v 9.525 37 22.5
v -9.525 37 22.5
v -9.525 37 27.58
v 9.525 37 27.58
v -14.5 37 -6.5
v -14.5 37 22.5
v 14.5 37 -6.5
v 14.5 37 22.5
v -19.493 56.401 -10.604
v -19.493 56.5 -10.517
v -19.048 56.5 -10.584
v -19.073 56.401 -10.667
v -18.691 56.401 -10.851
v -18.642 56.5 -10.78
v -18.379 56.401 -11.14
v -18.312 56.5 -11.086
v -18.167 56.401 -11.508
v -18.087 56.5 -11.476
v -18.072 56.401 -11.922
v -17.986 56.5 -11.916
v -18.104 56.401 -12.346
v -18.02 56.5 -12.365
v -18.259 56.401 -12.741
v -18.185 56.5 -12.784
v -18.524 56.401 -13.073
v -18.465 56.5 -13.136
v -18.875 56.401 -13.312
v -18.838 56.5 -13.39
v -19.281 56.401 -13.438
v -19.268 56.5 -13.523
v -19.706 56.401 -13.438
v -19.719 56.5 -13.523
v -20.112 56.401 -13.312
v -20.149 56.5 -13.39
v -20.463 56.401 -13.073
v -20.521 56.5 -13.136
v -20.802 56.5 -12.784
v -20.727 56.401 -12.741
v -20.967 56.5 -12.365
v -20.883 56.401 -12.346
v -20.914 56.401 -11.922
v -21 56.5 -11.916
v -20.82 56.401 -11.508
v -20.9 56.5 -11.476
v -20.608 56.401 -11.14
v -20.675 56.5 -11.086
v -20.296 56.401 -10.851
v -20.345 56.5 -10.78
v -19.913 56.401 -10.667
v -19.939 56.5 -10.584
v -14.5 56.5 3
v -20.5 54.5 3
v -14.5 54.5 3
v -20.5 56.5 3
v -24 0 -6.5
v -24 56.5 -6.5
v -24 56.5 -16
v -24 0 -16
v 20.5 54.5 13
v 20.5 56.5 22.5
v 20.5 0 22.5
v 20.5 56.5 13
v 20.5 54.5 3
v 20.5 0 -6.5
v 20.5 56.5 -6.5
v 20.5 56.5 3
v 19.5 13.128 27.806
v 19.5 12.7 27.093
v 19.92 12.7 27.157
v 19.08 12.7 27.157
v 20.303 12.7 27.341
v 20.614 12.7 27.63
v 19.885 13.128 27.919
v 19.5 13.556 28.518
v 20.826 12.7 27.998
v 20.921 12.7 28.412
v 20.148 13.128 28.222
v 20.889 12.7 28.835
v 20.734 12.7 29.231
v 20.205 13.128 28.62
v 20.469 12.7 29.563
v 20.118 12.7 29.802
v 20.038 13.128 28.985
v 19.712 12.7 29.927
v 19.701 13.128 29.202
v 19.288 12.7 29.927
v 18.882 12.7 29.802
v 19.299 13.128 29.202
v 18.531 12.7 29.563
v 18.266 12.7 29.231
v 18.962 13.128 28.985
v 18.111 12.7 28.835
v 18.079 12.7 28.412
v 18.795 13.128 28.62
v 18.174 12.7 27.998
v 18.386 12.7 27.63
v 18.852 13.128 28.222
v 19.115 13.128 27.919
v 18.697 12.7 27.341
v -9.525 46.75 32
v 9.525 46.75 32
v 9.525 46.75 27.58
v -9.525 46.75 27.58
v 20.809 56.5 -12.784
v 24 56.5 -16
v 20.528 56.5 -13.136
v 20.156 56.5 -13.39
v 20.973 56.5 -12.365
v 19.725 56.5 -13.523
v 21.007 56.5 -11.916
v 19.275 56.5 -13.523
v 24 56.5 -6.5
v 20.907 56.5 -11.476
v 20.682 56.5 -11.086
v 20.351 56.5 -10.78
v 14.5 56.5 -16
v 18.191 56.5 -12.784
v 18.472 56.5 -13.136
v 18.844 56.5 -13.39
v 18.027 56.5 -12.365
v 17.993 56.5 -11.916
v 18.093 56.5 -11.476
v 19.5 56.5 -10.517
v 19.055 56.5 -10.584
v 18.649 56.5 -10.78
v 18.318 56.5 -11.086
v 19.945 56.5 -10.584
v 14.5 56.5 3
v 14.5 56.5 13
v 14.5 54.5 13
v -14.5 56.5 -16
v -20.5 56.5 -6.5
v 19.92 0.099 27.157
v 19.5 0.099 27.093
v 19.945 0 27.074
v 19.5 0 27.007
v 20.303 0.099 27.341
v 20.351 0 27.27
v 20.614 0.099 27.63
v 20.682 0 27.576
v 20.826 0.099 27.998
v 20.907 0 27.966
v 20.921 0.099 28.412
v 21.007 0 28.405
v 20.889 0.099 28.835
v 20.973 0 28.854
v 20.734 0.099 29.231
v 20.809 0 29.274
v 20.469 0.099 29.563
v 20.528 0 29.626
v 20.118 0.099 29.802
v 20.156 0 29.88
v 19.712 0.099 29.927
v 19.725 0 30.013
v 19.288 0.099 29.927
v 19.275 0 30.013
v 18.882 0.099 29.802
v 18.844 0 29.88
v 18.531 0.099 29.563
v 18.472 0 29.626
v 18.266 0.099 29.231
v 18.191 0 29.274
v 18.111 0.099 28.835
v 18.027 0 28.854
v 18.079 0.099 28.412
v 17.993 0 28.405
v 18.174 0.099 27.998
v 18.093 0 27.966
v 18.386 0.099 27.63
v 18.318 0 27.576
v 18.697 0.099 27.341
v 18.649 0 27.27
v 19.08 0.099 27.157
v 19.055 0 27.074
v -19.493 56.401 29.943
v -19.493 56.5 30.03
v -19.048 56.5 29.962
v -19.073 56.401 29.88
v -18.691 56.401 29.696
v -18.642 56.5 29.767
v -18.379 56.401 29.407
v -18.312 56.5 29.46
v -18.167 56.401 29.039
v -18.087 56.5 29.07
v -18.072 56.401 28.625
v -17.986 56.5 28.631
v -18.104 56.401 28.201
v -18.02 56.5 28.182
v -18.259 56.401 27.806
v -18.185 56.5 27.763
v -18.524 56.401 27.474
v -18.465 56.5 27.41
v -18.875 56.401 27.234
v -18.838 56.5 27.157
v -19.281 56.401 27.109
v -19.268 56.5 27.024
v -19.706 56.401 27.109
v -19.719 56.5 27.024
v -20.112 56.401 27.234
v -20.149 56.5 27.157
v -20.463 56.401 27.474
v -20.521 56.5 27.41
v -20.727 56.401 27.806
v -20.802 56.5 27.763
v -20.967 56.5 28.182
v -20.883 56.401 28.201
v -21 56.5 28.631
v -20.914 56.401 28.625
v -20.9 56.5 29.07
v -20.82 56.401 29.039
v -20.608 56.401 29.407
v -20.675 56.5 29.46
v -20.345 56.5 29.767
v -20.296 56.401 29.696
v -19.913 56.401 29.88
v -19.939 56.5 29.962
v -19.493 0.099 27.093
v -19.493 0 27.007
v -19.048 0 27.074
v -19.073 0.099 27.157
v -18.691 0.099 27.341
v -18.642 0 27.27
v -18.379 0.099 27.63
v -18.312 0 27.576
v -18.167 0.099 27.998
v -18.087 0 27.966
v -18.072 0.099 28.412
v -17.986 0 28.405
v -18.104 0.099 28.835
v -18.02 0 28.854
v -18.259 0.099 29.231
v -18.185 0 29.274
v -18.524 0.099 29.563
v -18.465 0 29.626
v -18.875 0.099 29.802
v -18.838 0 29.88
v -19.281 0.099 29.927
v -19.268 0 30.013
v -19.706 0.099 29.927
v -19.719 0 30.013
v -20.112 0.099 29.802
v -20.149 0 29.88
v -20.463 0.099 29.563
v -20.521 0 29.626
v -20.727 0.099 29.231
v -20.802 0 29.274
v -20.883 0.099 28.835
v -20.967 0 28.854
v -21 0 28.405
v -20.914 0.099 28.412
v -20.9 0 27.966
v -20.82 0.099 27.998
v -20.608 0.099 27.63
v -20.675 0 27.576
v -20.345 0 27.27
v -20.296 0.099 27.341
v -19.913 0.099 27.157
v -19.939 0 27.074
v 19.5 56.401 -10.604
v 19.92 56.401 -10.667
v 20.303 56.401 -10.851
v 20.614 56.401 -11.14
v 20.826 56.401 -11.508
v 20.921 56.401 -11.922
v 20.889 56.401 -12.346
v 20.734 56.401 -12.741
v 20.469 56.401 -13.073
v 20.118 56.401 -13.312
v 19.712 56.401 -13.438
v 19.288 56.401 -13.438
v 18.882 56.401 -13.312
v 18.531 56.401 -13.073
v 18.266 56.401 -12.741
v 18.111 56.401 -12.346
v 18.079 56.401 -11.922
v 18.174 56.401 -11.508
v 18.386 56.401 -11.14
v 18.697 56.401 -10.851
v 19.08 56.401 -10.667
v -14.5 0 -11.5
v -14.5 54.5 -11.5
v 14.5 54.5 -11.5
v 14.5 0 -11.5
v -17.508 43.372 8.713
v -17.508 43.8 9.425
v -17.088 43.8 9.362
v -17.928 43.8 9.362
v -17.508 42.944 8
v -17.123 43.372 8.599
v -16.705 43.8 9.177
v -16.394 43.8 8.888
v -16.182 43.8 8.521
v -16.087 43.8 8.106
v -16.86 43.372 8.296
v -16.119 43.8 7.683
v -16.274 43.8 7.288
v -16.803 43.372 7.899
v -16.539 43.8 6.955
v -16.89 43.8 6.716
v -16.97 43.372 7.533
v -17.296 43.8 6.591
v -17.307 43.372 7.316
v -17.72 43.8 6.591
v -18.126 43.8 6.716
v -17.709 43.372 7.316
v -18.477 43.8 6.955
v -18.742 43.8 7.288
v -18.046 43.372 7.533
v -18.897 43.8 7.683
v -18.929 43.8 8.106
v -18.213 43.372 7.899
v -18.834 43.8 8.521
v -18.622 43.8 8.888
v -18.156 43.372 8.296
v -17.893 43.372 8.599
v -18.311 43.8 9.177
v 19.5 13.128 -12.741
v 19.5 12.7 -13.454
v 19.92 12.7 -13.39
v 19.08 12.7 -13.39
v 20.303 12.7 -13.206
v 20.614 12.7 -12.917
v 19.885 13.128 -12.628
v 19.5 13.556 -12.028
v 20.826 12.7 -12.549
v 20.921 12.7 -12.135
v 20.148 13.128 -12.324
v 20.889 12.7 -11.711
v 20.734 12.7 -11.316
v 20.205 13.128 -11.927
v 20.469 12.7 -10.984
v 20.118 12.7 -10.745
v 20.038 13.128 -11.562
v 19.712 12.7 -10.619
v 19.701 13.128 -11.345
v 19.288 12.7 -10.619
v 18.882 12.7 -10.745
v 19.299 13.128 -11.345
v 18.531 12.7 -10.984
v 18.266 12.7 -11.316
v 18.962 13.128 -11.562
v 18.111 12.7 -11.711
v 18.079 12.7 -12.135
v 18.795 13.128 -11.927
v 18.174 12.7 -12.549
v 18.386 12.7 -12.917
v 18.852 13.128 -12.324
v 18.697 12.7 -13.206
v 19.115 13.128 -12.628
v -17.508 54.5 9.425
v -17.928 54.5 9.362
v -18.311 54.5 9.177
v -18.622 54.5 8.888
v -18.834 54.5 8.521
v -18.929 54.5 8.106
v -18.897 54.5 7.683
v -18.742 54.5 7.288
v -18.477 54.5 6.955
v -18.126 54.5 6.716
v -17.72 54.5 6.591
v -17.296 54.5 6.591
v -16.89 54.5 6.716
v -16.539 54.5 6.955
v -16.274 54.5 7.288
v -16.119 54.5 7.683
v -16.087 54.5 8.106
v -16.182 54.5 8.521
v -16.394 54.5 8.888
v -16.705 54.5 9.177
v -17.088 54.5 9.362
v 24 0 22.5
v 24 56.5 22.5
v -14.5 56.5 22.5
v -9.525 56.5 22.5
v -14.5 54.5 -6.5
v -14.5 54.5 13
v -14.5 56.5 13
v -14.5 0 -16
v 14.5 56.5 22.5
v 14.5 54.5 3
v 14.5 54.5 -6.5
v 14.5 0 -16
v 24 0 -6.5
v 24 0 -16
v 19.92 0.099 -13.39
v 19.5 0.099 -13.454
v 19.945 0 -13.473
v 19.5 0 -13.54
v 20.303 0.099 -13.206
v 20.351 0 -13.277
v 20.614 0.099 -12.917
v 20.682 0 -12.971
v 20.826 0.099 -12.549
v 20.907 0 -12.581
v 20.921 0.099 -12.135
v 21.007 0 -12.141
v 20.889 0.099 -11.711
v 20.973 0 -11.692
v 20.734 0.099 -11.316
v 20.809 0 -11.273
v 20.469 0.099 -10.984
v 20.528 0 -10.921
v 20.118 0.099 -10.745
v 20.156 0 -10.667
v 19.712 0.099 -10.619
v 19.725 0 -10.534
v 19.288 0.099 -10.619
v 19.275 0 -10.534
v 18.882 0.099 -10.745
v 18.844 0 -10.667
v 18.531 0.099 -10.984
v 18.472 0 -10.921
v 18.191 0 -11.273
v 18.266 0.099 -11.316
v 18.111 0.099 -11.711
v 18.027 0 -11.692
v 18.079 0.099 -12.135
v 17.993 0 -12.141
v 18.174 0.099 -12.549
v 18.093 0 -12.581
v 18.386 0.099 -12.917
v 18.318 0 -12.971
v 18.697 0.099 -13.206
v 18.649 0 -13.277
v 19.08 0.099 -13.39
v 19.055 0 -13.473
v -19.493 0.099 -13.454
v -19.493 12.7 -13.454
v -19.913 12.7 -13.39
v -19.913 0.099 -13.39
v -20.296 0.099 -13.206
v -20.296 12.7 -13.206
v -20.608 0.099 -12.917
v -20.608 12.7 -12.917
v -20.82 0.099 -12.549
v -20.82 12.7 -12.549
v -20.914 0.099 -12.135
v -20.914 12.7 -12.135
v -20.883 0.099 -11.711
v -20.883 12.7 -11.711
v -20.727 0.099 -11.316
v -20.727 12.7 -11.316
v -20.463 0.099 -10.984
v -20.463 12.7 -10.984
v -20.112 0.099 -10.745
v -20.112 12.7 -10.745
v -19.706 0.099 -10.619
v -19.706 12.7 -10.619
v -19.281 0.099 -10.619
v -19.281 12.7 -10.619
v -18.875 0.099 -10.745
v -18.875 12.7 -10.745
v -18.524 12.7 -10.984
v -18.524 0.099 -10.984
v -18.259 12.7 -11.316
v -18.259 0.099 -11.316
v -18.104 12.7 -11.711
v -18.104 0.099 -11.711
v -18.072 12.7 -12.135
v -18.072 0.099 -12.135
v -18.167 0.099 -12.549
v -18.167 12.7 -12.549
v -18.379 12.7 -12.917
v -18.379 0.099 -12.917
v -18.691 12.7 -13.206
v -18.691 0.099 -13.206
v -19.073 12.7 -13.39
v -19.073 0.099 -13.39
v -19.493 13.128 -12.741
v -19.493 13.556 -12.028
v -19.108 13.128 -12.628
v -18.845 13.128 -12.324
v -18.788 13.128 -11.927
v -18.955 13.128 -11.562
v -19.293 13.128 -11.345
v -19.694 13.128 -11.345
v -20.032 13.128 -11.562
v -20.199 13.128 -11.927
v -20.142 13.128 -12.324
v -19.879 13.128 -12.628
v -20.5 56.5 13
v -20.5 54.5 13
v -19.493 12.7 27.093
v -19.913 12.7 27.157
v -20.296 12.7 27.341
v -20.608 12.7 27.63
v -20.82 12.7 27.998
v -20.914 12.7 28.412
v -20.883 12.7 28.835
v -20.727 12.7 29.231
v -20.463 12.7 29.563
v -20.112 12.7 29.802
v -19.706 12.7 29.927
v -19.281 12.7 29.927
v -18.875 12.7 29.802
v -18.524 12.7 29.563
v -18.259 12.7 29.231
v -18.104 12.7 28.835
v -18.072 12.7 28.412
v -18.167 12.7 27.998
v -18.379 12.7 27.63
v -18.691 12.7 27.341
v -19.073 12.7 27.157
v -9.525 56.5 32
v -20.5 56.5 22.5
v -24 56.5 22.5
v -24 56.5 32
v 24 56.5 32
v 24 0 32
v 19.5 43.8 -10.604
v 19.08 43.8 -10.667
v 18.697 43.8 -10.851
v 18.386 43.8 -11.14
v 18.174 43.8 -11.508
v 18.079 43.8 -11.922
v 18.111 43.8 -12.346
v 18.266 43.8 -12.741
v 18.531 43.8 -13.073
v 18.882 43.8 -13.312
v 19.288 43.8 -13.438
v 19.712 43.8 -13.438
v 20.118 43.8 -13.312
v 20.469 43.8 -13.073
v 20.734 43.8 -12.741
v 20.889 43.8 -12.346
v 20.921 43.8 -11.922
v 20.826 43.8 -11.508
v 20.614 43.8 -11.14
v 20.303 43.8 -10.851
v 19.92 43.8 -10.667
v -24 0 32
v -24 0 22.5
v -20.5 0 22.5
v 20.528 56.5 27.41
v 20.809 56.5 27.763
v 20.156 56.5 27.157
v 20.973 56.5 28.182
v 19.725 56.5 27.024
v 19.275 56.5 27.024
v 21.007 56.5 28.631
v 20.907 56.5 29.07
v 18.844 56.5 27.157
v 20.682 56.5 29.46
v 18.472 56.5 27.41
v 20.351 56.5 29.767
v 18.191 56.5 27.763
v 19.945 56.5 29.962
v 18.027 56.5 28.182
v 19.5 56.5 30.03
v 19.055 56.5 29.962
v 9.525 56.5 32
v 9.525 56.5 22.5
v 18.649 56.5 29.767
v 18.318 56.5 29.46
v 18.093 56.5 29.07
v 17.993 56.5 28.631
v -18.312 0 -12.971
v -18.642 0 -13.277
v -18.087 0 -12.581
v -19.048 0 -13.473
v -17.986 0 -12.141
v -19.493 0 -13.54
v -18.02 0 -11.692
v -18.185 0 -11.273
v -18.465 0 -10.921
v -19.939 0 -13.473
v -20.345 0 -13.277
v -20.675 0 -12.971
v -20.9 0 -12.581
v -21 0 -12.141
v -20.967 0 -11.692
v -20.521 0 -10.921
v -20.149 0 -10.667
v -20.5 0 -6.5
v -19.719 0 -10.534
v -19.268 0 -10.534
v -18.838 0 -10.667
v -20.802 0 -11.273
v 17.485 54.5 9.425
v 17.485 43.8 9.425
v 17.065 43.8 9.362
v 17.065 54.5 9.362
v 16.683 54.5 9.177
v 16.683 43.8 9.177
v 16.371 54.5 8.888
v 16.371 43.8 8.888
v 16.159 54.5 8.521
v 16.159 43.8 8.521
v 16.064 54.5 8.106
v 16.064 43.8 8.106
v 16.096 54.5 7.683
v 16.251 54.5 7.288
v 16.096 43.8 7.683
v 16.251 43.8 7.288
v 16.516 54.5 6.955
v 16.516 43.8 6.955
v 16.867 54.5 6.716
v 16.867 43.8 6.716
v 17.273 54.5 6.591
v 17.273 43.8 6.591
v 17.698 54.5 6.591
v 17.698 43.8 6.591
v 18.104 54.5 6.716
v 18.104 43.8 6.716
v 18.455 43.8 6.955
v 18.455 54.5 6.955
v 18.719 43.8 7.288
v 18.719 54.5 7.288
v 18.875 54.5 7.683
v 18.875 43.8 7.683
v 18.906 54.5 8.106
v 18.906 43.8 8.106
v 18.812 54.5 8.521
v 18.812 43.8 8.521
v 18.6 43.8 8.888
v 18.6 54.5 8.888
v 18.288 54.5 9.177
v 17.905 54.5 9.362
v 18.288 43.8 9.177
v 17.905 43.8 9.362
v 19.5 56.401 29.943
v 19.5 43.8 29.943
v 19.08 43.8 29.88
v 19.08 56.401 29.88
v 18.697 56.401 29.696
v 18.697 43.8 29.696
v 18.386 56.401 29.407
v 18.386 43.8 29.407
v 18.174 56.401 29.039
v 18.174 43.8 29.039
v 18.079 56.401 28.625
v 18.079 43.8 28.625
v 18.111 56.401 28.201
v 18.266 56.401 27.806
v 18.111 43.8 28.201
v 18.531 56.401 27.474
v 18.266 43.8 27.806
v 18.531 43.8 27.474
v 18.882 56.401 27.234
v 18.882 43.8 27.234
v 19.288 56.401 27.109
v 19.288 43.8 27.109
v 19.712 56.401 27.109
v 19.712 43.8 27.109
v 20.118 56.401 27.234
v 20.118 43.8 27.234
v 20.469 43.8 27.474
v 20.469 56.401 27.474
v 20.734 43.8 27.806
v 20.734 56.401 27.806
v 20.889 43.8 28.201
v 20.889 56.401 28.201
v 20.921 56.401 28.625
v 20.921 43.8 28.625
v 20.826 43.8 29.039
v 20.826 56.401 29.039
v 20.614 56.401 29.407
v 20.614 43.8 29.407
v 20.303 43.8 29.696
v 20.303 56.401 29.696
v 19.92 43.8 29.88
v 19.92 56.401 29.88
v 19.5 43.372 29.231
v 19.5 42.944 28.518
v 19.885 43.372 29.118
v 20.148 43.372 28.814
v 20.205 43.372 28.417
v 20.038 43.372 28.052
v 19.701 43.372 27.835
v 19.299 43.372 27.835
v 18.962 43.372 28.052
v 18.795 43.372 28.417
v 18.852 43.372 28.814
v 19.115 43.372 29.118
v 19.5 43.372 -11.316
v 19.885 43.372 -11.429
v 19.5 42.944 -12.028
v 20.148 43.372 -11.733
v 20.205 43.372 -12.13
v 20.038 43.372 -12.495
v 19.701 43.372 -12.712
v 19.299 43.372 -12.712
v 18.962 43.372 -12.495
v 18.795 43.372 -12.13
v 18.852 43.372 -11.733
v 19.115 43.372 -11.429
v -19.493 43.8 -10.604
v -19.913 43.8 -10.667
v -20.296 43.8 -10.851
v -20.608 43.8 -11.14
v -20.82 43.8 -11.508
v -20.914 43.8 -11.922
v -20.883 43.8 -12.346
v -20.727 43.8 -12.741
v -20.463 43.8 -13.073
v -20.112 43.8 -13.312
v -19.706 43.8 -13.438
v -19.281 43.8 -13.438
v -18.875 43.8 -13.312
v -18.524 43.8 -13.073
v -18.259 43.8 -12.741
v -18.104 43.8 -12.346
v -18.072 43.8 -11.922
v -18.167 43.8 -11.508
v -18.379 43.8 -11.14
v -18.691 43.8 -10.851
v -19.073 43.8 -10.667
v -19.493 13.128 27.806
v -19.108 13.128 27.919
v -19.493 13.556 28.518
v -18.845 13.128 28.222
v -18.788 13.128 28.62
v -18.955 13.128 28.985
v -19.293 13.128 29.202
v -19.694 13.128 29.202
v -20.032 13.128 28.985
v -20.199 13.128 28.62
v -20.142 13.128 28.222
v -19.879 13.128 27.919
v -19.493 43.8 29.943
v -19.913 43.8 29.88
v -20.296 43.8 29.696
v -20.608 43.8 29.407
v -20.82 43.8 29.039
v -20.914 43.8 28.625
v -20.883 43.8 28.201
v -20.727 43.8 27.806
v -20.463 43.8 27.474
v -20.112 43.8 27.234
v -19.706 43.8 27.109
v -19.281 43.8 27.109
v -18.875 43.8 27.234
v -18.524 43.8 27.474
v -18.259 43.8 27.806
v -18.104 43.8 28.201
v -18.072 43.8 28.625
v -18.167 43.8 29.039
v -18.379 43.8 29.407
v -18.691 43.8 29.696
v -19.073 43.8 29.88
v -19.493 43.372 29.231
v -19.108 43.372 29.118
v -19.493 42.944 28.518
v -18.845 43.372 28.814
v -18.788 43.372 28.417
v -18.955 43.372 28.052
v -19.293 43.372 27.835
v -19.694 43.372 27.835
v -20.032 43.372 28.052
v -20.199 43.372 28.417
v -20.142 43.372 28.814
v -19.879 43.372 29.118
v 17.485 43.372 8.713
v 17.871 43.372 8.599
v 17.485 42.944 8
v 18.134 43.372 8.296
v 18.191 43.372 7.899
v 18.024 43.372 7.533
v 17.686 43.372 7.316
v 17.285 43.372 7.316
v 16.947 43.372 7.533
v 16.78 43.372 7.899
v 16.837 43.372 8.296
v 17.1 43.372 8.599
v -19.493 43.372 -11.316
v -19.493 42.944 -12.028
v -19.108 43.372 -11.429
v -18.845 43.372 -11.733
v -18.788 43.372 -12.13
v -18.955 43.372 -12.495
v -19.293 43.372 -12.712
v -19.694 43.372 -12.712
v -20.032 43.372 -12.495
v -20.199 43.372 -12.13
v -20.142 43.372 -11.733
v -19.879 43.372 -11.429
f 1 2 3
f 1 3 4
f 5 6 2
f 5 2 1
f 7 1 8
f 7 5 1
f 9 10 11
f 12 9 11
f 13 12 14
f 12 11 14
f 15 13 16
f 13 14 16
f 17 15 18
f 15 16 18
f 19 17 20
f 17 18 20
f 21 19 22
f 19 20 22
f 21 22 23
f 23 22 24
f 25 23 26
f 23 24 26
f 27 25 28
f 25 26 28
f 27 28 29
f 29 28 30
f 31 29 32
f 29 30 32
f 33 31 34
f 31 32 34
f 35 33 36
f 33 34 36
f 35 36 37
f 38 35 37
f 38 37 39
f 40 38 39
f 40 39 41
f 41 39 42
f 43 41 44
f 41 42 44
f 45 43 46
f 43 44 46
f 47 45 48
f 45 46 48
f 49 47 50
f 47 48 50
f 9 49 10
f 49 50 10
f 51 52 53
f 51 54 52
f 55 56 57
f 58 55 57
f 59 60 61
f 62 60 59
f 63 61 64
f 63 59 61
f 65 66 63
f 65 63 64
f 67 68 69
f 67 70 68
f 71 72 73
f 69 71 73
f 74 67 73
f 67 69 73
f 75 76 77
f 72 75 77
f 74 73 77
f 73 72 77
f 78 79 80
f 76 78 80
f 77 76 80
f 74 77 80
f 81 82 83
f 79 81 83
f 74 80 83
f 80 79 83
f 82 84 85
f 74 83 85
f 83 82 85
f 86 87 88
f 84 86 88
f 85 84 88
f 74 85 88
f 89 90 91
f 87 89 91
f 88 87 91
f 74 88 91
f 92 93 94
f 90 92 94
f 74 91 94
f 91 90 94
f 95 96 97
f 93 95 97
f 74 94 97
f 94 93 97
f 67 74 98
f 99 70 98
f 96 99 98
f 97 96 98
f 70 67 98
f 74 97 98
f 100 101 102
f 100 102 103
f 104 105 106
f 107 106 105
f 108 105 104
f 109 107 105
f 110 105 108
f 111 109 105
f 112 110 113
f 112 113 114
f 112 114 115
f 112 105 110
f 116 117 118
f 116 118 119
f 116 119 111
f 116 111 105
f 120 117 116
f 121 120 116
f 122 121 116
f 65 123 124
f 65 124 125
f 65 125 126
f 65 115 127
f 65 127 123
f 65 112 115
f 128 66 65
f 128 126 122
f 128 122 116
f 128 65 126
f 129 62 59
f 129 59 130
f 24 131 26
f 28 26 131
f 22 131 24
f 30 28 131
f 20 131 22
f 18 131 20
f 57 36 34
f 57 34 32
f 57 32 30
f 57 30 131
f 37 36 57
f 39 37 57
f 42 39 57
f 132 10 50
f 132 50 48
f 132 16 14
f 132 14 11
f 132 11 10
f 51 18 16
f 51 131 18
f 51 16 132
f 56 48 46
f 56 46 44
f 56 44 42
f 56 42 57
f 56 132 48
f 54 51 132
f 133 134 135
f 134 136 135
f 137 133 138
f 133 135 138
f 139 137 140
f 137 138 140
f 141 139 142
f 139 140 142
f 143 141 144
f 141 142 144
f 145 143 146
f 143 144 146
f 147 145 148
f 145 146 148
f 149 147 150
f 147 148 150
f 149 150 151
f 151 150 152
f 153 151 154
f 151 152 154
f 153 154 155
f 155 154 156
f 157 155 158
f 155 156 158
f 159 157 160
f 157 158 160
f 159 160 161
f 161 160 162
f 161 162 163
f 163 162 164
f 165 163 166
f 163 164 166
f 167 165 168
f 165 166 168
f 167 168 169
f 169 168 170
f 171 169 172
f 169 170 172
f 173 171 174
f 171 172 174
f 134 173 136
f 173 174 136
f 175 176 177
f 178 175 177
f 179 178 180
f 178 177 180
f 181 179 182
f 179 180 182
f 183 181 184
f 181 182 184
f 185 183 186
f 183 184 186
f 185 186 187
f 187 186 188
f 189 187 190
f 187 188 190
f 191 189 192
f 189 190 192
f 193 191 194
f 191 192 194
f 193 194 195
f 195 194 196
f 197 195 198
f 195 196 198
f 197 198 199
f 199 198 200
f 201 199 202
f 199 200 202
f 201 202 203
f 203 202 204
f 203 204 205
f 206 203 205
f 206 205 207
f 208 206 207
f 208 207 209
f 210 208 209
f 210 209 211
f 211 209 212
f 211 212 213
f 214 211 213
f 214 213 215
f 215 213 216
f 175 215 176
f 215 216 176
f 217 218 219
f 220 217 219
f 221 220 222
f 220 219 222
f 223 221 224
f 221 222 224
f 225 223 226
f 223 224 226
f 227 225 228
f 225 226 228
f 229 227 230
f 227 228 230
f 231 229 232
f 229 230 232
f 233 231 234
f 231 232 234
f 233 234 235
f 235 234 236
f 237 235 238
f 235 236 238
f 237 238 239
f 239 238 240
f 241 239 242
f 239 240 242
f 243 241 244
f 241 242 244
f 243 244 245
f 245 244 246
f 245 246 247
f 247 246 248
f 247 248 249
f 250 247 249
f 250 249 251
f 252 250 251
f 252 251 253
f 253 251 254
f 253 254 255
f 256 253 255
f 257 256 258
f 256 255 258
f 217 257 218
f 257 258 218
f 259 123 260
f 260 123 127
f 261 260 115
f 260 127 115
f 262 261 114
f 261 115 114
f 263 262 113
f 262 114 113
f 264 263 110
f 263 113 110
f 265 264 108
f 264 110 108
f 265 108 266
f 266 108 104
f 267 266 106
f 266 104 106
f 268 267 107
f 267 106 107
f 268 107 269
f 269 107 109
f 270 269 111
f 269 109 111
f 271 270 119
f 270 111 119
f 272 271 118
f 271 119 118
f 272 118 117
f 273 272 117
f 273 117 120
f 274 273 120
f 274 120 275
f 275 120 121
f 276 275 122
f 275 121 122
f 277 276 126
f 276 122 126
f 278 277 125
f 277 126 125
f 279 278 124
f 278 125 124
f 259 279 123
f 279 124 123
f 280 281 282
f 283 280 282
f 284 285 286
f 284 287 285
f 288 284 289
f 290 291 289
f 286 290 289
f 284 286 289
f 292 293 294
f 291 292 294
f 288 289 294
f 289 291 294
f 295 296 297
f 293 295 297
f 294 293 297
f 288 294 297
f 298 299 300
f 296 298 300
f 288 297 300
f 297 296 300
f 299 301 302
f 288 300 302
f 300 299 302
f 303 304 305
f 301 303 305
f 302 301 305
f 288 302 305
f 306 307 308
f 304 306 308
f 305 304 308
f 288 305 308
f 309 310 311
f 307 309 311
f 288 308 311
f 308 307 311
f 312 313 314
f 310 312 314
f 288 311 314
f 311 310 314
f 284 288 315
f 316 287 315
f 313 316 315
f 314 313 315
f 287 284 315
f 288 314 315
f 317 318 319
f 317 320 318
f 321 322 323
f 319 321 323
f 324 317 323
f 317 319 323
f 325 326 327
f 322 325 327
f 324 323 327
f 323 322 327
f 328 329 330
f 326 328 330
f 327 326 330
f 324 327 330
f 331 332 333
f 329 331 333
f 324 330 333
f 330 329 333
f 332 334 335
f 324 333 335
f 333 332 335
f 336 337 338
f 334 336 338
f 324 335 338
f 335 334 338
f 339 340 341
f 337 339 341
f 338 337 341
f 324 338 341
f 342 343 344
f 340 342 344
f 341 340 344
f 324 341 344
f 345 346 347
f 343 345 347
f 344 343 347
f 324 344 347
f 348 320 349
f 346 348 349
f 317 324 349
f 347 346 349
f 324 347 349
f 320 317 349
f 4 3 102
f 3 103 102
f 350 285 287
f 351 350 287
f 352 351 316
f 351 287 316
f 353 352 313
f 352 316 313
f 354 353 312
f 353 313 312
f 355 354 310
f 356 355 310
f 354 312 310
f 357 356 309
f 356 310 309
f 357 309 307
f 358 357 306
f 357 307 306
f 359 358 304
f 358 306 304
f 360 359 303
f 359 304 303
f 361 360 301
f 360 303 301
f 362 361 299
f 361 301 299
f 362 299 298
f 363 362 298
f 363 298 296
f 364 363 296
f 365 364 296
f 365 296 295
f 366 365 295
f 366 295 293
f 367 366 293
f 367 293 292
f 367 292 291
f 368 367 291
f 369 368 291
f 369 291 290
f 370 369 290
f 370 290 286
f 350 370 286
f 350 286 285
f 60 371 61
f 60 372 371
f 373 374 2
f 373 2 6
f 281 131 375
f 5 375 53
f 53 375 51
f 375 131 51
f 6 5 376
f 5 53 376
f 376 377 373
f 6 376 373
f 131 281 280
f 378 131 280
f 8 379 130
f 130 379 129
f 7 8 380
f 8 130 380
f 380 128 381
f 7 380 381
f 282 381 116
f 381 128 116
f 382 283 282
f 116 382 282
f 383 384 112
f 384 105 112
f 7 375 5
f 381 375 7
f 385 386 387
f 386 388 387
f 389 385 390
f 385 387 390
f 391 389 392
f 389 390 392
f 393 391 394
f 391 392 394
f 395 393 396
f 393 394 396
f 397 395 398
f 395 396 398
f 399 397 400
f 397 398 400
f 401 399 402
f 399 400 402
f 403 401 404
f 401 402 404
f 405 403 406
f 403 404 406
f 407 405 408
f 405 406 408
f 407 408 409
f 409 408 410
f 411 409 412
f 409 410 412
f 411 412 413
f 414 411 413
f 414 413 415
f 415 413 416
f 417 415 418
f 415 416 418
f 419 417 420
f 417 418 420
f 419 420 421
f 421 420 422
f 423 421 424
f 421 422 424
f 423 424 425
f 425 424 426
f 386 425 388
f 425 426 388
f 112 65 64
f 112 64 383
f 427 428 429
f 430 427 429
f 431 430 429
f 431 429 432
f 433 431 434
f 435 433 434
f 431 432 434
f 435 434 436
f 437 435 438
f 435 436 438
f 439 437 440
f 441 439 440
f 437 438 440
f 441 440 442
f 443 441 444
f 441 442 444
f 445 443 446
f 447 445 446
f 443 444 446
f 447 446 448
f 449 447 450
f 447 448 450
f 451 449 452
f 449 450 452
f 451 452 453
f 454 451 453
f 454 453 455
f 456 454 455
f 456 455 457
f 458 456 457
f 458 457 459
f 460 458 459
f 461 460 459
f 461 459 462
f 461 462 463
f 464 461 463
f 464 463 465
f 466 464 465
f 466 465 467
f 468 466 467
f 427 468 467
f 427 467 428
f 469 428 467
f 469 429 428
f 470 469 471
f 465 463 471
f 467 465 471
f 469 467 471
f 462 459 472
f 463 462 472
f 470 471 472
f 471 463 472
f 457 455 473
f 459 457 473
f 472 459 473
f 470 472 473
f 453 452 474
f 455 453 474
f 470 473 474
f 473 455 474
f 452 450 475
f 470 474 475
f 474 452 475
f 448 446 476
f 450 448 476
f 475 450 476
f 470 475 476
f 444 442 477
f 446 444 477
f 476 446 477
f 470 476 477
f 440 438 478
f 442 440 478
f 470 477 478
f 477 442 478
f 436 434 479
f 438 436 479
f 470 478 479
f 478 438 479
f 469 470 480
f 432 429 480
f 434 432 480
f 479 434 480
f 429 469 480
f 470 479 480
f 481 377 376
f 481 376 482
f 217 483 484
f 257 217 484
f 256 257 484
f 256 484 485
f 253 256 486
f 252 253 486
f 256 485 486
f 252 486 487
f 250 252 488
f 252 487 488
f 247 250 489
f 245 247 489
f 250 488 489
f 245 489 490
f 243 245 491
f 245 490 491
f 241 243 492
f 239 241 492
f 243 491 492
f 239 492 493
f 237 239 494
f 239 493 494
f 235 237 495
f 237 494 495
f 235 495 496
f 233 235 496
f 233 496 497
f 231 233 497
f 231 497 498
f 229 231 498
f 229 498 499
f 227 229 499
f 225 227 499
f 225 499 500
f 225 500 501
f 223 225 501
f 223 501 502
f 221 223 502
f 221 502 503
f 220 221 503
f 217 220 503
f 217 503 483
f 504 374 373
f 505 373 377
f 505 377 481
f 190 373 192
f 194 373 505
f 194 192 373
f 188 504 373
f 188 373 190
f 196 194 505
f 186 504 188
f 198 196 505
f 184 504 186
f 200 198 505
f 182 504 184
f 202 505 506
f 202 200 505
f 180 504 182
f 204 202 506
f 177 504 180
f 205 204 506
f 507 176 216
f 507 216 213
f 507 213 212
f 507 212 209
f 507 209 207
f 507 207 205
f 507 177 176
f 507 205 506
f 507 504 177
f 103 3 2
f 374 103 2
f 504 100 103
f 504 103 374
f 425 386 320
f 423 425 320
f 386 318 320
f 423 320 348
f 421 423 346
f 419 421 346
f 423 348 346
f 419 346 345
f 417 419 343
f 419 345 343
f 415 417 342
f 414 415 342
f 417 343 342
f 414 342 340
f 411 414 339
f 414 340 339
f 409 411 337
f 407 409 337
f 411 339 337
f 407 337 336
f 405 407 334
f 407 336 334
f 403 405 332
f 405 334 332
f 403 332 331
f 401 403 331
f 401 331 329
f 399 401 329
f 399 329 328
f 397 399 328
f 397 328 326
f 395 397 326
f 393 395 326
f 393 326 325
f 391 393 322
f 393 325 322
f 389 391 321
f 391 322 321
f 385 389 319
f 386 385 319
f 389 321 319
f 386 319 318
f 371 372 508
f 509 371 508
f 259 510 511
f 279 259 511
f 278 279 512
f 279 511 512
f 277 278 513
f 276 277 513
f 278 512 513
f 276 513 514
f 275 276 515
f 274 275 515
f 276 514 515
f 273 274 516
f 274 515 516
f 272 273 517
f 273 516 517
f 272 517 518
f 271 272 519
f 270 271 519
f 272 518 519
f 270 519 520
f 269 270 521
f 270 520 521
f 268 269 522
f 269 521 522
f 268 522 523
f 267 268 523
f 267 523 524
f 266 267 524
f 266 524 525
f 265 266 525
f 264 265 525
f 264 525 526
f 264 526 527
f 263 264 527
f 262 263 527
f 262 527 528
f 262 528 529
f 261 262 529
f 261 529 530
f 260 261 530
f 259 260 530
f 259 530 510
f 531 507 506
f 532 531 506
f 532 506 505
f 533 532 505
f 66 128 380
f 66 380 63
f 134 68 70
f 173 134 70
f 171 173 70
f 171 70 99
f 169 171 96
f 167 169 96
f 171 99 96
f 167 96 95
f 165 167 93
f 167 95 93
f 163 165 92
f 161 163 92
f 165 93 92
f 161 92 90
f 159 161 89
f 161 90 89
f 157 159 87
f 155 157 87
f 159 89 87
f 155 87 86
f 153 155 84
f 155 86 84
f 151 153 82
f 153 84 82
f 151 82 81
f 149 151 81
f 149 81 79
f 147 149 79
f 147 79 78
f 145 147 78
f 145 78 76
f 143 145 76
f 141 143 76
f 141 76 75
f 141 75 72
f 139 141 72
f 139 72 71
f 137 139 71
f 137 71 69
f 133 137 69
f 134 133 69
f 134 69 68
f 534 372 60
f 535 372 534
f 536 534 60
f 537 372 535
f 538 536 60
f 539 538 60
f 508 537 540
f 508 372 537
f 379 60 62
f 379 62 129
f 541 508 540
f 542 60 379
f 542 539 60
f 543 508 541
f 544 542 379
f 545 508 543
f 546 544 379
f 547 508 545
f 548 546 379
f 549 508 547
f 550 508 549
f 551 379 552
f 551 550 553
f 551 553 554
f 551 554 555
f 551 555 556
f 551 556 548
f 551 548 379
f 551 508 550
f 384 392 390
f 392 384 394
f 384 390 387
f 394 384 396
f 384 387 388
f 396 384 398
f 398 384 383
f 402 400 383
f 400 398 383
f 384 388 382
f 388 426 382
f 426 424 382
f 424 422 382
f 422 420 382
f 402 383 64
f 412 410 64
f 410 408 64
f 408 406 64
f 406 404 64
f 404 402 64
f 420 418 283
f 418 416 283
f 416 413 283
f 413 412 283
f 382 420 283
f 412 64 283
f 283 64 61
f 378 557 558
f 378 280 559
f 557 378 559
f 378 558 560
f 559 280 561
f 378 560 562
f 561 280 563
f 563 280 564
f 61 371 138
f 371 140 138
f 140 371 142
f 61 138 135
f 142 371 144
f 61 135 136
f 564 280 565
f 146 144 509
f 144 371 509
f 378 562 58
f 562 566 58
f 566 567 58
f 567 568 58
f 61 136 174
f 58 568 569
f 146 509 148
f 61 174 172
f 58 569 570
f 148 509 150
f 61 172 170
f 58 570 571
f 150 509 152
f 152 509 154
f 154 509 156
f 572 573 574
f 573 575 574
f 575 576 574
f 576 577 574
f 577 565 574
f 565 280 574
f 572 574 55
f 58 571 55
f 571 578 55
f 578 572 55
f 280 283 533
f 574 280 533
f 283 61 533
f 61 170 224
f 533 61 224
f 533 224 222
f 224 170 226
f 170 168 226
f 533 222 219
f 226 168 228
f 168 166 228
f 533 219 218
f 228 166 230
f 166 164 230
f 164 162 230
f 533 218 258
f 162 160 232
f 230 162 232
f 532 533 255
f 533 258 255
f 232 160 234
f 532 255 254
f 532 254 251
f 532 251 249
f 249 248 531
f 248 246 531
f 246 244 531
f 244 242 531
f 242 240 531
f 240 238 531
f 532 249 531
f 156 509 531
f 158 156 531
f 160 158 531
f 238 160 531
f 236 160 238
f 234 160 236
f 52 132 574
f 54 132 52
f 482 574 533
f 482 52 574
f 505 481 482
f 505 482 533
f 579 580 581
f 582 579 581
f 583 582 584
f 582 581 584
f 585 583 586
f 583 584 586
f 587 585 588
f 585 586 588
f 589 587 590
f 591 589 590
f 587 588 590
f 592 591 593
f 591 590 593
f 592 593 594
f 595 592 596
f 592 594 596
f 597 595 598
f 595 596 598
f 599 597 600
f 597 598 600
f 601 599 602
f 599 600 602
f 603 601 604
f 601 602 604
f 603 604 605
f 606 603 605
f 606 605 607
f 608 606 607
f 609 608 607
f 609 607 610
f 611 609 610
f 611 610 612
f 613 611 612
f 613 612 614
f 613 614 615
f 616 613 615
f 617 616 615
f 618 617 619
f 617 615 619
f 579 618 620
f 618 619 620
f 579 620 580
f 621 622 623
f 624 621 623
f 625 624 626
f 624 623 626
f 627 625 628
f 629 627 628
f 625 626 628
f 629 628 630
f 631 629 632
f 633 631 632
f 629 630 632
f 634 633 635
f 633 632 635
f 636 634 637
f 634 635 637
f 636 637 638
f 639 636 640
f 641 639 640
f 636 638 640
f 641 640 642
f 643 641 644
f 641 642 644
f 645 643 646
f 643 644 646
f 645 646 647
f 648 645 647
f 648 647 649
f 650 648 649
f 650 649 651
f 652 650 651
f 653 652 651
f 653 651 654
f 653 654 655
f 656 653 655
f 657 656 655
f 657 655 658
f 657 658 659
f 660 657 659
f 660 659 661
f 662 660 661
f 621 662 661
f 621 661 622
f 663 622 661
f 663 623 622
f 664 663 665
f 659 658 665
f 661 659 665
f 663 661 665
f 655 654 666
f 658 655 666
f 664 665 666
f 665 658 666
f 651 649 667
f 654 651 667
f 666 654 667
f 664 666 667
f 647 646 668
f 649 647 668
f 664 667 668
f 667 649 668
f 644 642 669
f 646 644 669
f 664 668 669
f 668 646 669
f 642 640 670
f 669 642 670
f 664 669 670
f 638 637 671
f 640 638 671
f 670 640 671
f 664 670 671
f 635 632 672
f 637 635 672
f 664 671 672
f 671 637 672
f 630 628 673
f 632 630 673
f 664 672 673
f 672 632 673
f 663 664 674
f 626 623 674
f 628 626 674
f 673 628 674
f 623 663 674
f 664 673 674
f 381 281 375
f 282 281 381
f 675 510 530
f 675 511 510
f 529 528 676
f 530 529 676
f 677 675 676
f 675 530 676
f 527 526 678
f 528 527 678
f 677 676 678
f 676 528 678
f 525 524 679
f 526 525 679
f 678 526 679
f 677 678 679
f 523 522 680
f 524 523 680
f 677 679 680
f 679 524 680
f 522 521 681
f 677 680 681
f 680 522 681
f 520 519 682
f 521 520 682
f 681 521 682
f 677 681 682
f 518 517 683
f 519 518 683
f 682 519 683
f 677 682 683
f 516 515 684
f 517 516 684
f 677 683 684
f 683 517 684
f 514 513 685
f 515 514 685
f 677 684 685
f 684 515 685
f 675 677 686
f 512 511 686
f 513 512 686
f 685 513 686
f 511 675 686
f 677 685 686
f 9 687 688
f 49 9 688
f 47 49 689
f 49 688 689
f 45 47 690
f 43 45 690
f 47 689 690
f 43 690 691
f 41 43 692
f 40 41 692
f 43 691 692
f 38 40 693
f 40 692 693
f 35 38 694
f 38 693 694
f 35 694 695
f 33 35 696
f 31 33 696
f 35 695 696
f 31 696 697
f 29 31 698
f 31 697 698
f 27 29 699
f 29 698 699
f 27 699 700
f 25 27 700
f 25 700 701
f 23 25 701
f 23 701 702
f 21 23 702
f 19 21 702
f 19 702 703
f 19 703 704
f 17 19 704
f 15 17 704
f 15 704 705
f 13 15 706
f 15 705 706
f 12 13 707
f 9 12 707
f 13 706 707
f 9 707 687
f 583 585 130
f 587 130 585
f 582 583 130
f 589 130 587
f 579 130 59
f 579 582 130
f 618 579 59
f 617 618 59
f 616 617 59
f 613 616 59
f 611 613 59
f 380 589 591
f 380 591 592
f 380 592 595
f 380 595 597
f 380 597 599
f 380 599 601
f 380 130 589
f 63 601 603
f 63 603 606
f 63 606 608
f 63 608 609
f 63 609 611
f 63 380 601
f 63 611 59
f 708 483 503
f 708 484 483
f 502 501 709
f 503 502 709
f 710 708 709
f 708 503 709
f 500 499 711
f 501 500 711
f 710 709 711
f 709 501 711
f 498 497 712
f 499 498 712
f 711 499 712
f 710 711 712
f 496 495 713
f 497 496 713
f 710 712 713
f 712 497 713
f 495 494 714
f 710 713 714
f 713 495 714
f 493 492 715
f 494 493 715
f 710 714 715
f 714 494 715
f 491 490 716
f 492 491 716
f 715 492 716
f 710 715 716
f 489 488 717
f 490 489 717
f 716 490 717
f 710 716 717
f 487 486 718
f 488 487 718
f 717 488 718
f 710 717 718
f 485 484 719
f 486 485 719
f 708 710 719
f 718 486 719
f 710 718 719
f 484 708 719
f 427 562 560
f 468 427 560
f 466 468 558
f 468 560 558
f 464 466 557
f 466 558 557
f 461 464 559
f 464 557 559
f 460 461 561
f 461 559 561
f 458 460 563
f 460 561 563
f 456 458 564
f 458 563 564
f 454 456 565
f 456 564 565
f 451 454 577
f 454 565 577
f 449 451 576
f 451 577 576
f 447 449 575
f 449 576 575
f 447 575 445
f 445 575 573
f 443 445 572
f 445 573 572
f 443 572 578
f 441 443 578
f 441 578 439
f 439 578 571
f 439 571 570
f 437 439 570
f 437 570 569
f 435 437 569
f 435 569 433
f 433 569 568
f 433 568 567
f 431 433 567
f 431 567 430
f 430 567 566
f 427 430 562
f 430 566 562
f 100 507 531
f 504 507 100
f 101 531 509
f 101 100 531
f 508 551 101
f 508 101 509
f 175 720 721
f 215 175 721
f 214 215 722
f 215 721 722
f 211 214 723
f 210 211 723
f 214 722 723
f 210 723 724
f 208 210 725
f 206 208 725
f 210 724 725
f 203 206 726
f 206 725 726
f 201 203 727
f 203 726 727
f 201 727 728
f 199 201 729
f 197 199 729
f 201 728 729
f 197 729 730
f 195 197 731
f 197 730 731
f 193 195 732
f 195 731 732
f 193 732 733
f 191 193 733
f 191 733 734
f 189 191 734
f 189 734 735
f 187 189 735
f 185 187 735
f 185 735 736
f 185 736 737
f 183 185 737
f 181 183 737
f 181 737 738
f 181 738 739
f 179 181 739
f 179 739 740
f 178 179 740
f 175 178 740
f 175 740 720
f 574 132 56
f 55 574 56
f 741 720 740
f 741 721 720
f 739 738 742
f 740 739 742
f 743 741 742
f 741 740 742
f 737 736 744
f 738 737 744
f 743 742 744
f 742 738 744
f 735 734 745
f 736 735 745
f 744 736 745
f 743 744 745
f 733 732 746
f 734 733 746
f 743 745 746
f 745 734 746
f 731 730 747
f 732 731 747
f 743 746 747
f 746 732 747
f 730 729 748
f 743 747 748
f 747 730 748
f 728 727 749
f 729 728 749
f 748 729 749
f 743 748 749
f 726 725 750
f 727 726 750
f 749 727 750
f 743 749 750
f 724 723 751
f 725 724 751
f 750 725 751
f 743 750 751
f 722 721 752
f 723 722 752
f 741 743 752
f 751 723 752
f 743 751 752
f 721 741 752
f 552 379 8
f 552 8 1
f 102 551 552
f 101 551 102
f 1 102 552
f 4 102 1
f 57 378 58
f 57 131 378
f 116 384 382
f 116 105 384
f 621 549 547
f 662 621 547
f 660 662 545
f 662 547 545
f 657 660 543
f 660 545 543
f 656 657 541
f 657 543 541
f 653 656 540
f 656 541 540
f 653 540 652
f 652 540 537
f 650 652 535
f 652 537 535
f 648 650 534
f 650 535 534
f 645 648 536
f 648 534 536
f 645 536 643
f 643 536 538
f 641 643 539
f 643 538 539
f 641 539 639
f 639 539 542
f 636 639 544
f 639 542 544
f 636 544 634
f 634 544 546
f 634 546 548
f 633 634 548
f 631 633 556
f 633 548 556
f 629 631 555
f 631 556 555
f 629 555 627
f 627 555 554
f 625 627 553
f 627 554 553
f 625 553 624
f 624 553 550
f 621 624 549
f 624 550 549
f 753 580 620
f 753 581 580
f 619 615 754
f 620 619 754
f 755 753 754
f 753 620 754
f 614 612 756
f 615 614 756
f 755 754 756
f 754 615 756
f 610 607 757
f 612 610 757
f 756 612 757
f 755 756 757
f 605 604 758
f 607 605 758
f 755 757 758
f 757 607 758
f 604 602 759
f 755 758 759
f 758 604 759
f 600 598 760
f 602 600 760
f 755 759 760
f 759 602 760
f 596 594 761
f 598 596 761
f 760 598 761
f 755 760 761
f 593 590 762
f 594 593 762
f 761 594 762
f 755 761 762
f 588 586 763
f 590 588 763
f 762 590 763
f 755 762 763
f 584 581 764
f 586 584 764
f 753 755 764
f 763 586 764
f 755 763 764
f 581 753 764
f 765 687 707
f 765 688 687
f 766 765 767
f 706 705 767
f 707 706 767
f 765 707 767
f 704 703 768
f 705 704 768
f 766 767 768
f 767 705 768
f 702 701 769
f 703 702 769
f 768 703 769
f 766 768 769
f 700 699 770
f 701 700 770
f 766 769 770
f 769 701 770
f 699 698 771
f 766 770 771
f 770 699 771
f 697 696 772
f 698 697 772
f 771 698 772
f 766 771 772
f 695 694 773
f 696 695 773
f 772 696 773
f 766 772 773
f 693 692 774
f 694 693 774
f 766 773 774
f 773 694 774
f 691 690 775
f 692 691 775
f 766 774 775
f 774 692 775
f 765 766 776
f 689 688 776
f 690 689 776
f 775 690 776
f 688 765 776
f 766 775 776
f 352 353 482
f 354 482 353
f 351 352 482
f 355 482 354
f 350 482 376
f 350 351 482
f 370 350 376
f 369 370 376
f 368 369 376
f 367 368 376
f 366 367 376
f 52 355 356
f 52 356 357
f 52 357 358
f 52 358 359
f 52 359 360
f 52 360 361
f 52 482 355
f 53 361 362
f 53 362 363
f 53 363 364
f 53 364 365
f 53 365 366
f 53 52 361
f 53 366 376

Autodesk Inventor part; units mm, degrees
ref_plane "YZ Plane" through (0, 0, 0) normal (1, 0, 0) x (0, 1, 0)
ref_plane "XZ Plane" through (0, 0, 0) normal (0, 1, 0) x (-1, 0, 0)
ref_plane "XY Plane" through (0, 0, 0) normal (0, 0, 1) x (1, 0, 0)
sketch "Sketch1" plane through (0, 0, 0) normal (0, 1, 0) x (-1, 0, 0)
  line L0 (101.6, 101.6) -> (-101.6, 101.6)
  line L1 (-101.6, 101.6) -> (-101.6, -101.6)
  line L2 (-101.6, -101.6) -> (101.6, -101.6)
  line L3 (101.6, -101.6) -> (101.6, 101.6)
  circle A0 centre (0, 0) radius 2.5
  line L4 (9.525, -6.5) -> (-9.525, -6.5)
  line L5 (0, 0) -> (0, 8)
  line L6 (-14.5, -6.5) -> (-14.5, 22.5)
  line L7 (14.5, 22.5) -> (14.5, -6.5)
  circle A1 centre (0, 8) radius 14
  line L8 (-14.5, 22.5) -> (14.5, 22.5)
  line L9 (14.5, -6.5) -> (-14.5, -6.5)
  line L10 (-24.5, 32.5) -> (24.5, 32.5)
  line L11 (24.5, 32.5) -> (24.5, -16.5)
  line L12 (24.5, -16.5) -> (-24.5, -16.5)
  line L13 (-24.5, -16.5) -> (-24.5, 32.5)
  line L14 (-9.525, 22.5) -> (9.525, 22.5)
  line L15 (9.525, 22.5) -> (9.525, 27.58)
  line L16 (9.525, 27.58) -> (-9.525, 27.58)
  line L17 (-9.525, 27.58) -> (-9.525, 22.5)
  point P0 (9.525, 22.5)
  point P1 (-9.525, -6.5)
  dimension "d0" = 203.2
  dimension "d1" = 203.2
  dimension "d2" = 8
  dimension "d3" = 28
  dimension "d4" = 29
  dimension "d5" = 29
  dimension "d6" = 14.5
  dimension "d7" = 10
  dimension "d8" = 10
  dimension "d9" = 10
  dimension "d10" = 10
  dimension "d11" = 5.08
  dimension "d12" = 9.525
  dimension "d13" = 9.525
  dimension "d14" = 101.6
  dimension "d15" = 101.6
extrude "Extrusion1" add sketch "Sketch1" along normal blind 56.5 contours A0 | L4 L9 L6 L8 L7 | L8 L17 L16 L15 | A1 | L10 L11 L12 L13
sketch "Sketch2" plane through (0, 56.5, 0) normal (0, 1, 0) x (1, 0, 0)
  line L0 (101.6, 101.6) -> (-101.6, 101.6)
  line L1 (-101.6, 101.6) -> (-101.6, -101.6)
  line L2 (-101.6, -101.6) -> (101.6, -101.6)
  line L3 (101.6, -101.6) -> (101.6, 101.6)
  circle A0 centre (0, 0) radius 2.5
  line L4 (-9.525, 6.5) -> (9.525, 6.5)
  line L5 (0, 0) -> (0, -8)
  line L6 (14.5, 6.5) -> (14.5, -22.5)
  line L7 (-14.5, -22.5) -> (-14.5, 6.5)
  circle A1 centre (0, -8) radius 14
  line L8 (14.5, -22.5) -> (-14.5, -22.5)
  line L9 (-14.5, 6.5) -> (14.5, 6.5)
  line L10 (24.5, -32.5) -> (-24.5, -32.5)
  line L11 (-24.5, -32.5) -> (-24.5, 16.5)
  line L12 (-24.5, 16.5) -> (24.5, 16.5)
  line L13 (24.5, 16.5) -> (24.5, -32.5)
  line L14 (9.525, -22.5) -> (-9.525, -22.5)
  line L15 (-9.525, -22.5) -> (-9.525, -27.58)
  line L16 (-9.525, -27.58) -> (9.525, -27.58)
  line L17 (9.525, -27.58) -> (9.525, -22.5)
  point P0 (9.525, 22.5)
  point P1 (-9.525, -6.5)
  dimension "d18" = 203.2
  dimension "d19" = 203.2
  dimension "d20" = 8
  dimension "d21" = 28
  dimension "d22" = 29
  dimension "d23" = 29
  dimension "d24" = 14.5
  dimension "d25" = 10
  dimension "d26" = 10
  dimension "d27" = 10
  dimension "d28" = 10
  dimension "d29" = 5.08
  dimension "d30" = 9.525
  dimension "d31" = 9.525
  dimension "d32" = 101.6
  dimension "d33" = 101.6
extrude "Extrusion2" cut sketch "Sketch2" against normal blind 19.5 contours A0 | L4 L9 L6 L8 L7 | L8 L17 L16 L15 | A1
sketch "Sketch4" plane through (0, 56.5, 0) normal (0, 1, 0) x (1, 0, 0)
  circle A0 centre (-17.508, -8) radius 2
  circle A1 centre (17.4854, -8) radius 2
  circle A2 centre (17.4854, -8) radius 2
  circle A3 centre (0, -8.01) radius 14
  circle A4 centre (0, -0.01) radius 2.5
  circle A5 centre (-19.4934, 12.0285) radius 2.2448
  circle A6 centre (19.5, 12.0285) radius 2.3104
  circle A7 centre (19.5, -28.5182) radius 2.2008
  circle A8 centre (-19.4934, -28.5182) radius 2.3894
  point P0 (0, 0)
  dimension "d37" = 34.9934
  dimension "d38" = 28
  dimension "d39" = 8
  dimension "d65" = 8
  dimension "d66" = 8
hole "Hole1" at (-17.508, 56.5, 8) at (17.4854, 56.5, 8) at (-19.4934, 56.5, 28.5182) at (19.5, 56.5, 28.5182) at (-19.4934, 56.5, -12.0285) at (19.5, 56.5, -12.0285) direction (0, -1, 0) diameter 2.85 depth 12.7 tip angle 118 countersink diameter 3.0226 countersink angle 82 thread size "M3.5x0.6" class "6H" standard "ANSI Metric M Profile"
sketch "Sketch5" plane through (0, 0, 0) normal (0, -1, 0) x (1, 0, 0)
  circle A0 centre (-19.4934, 28.5182) radius 1.425 projected
  circle A1 centre (-19.4934, 28.5182) radius 1.425
  circle A2 centre (19.5, 28.5182) radius 1.425 projected
  circle A3 centre (19.5, 28.5182) radius 1.425
  circle A4 centre (19.5, -12.0285) radius 1.425 projected
  circle A5 centre (19.5, -12.0285) radius 1.425
  circle A6 centre (-19.4934, -12.0285) radius 1.5113 projected
  circle A7 centre (-19.4934, -12.0285) radius 1.5113
  point P0 (0, 0)
hole "Hole2" at (19.5, 0, -12.0285) at (-19.4934, 0, -12.0285) at (-19.4934, 0, 28.5182) at (19.5, 0, 28.5182) direction (0, 1, 0) diameter 2.85 depth 12.7 tip angle 118 countersink diameter 3.0226 countersink angle 82 thread size "M3.5x0.6" class "6H" standard "ANSI Metric M Profile"
sketch "Sketch6" plane through (-24.5, 0, 32.5) normal (0, 0, 1) x (1, 0, 0)
  line L0 (34.025, 56.5) -> (34.025, 37) projected
  line L1 (14.975, 56.5) -> (34.025, 56.5)
  line L2 (34.025, 56.5) -> (34.025, 46.75)
  line L3 (34.025, 46.75) -> (14.975, 46.75)
  line L4 (14.975, 46.75) -> (14.975, 56.5)
  point P0 (24.5, 0)
extrude "Extrusion3" cut sketch "Sketch6" against normal blind 25.4
sketch "Sketch8" plane through (0, 56.5, 0) normal (0, 1, 0) x (1, 0, 0)
  line L0 (-24.5, -3) -> (24.5, -3)
  line L1 (24.5, -3) -> (24.5, -13)
  line L2 (24.5, -13) -> (-24.5, -13)
  line L3 (-24.5, -13) -> (-24.5, -3)
  line L4 (14.5, 6.5) -> (14.5, -22.5) projected
  line L5 (14.5, -3) -> (14.5, -13)
  line L6 (-14.5, -22.5) -> (-14.5, 6.5) projected
  line L7 (-14.5, -3) -> (-14.5, -13)
  line L8 (24.5, -32.5) -> (24.5, 16.5) projected
  line L9 (-24.5, 16.5) -> (-24.5, -32.5) projected
  point P0 (0, 0)
  dimension "d58" = 10
  dimension "d60" = 0
  dimension "d61" = 0
  dimension "d62" = 3
extrude "Extrusion4" cut sketch "Sketch8" against normal blind 2 contours L0 L6 L2 L3 | L0 L1 L2 L4
sketch "Sketch9" plane through (0, 56.5, 0) normal (0, 1, 0) x (1, 0, 0)
  line L0 (-14.5, 6.5) -> (14.5, 6.5) projected
  line L1 (24.5, 16.5) -> (-24.5, 16.5) projected
  line L2 (-14.5, 6.5) -> (14.5, 6.5)
  line L3 (14.5, 6.5) -> (14.5, 16.5)
  line L4 (14.5, 16.5) -> (-14.5, 16.5)
  line L5 (-14.5, 16.5) -> (-14.5, 6.5)
  line L6 (14.5, 6.5) -> (14.5, -3) projected
  line L7 (-14.5, 11.5) -> (14.5, 11.5)
  line L8 (-24.5, 16.5) -> (-24.5, -32.5) projected
  line L9 (-14.5, 6.5) -> (-24.5, 6.5)
  line L10 (-24.5, 6.5) -> (-24.5, -22.5)
  line L11 (-24.5, -22.5) -> (-14.5, -22.5)
  line L12 (-14.5, -22.5) -> (-14.5, 6.5)
  line L13 (-9.525, -22.5) -> (-14.5, -22.5) projected
  line L14 (-20.5, 6.5) -> (-20.5, -22.5)
  line L15 (24.5, -32.5) -> (24.5, 16.5) projected
  line L16 (24.5, -22.5) -> (20.5, -22.5)
  line L17 (20.5, -22.5) -> (20.5, 6.5)
  line L18 (20.5, 6.5) -> (24.5, 6.5)
  line L19 (24.5, 6.5) -> (24.5, -22.5)
  point P0 (0, 0)
  point P1 (-14.5, 16.5)
  dimension "d67" = 0
  dimension "d68" = 5
  dimension "d69" = 0
  dimension "d71" = 4
  dimension "d72" = 4
extrude "Extrusion5" cut sketch "Sketch9" against normal through all contours L15 L16 L17 L18 | L5 L1 L3 L7 | L14 L11 L8 L9
sketch "Sketch11" plane through (0, 37, 0) normal (0, 1, 0) x (1, 0, 0)
  line L0 (-20.5, -3) -> (-14.5, -3) projected
  line L1 (20.5, -13) -> (20.5, -3) projected
  line L2 (-20.5, -3) -> (20.5, -3)
  line L3 (20.5, -3) -> (20.5, -13)
  line L4 (20.5, -13) -> (-20.5, -13)
  line L5 (-20.5, -13) -> (-20.5, -3)
  point P0 (0, 0)
  dimension "d75" = 41
  dimension "d76" = 10
sketch "Sketch12" plane through (14.5, 56.5, -11.5) normal (0, 0, -1) x (-1, 0, 0)
  line L0 (0, 0) -> (-6, 0) projected
  line L1 (29, 0) -> (29, -19.5) projected
  line L2 (0, 0) -> (29, 0)
  line L3 (29, 0) -> (29, -2)
  line L4 (29, -2) -> (0, -2)
  line L5 (0, -2) -> (0, 0)
  point P0 (14.5, -56.5)
  dimension "d77" = 2
extrude "Extrusion6" cut sketch "Sketch12" against normal blind 25.4
sketch "Sketch14" plane through (0, 56.5, 0) normal (0, 1, 0) x (1, 0, 0)
  line L0 (-14.5, 16.5) -> (-24.5, 16.5) projected
  line L1 (24.5, 6.5) -> (24.5, 16.5) projected
  line L2 (-24.5, 16.5) -> (24.5, 16.5)
  line L3 (24.5, 16.5) -> (24.5, 16)
  line L4 (24.5, 16) -> (-24.5, 16)
  line L5 (-24.5, 16) -> (-24.5, 16.5)
  line L6 (24.5, 16.5) -> (14.5, 16.5) projected
  line L7 (9.525, -32.5) -> (24.5, -32.5) projected
  line L8 (24.5, 16.5) -> (24, 16.5)
  line L9 (24, 16.5) -> (24, -32.5)
  line L10 (24, -32.5) -> (24.5, -32.5)
  line L11 (24.5, -32.5) -> (24.5, 16.5)
  line L12 (-24.5, -22.5) -> (-24.5, -32.5) projected
  line L13 (24.5, -32.5) -> (-24.5, -32.5)
  line L14 (-24.5, -32.5) -> (-24.5, -32)
  line L15 (-24.5, -32) -> (24.5, -32)
  line L16 (24.5, -32) -> (24.5, -32.5)
  line L17 (-24.5, -32.5) -> (-9.525, -32.5) projected
  line L18 (-24.5, -32.5) -> (-24, -32.5)
  line L19 (-24, -32.5) -> (-24, 16.5)
  line L20 (-24, 16.5) -> (-24.5, 16.5)
  line L21 (-24.5, 16.5) -> (-24.5, -32.5)
  point P0 (0, 0)
  point P1 (-24.5, 16)
  point P2 (24, 16)
  point P3 (24, -32)
  point P4 (-24, -32)
  point P5 (-24, 16)
  dimension "d89" = 0.5
  dimension "d90" = 0.5
  dimension "d91" = 0.5
  dimension "d92" = 0.5
extrude "Extrusion8" cut sketch "Sketch14" against normal through all contours L2 L9 L4 L19 L0 | L19 L4 L5 L0 | L19 L15 L12 L21 L4 | L2 L1 L4 L9 | L4 L1 L11 L15 L9 | L19 L13 L12 L15 | L15 L9 L7 L13 L19 | L15 L11 L7 L9
sketch "Sketch15" plane through (20.5, 56.5, 22.5) normal (1, 0, 0) x (0, 0, -1)
  point P0 (22.5, -56.5)
properties part number "Motor_Holder"
